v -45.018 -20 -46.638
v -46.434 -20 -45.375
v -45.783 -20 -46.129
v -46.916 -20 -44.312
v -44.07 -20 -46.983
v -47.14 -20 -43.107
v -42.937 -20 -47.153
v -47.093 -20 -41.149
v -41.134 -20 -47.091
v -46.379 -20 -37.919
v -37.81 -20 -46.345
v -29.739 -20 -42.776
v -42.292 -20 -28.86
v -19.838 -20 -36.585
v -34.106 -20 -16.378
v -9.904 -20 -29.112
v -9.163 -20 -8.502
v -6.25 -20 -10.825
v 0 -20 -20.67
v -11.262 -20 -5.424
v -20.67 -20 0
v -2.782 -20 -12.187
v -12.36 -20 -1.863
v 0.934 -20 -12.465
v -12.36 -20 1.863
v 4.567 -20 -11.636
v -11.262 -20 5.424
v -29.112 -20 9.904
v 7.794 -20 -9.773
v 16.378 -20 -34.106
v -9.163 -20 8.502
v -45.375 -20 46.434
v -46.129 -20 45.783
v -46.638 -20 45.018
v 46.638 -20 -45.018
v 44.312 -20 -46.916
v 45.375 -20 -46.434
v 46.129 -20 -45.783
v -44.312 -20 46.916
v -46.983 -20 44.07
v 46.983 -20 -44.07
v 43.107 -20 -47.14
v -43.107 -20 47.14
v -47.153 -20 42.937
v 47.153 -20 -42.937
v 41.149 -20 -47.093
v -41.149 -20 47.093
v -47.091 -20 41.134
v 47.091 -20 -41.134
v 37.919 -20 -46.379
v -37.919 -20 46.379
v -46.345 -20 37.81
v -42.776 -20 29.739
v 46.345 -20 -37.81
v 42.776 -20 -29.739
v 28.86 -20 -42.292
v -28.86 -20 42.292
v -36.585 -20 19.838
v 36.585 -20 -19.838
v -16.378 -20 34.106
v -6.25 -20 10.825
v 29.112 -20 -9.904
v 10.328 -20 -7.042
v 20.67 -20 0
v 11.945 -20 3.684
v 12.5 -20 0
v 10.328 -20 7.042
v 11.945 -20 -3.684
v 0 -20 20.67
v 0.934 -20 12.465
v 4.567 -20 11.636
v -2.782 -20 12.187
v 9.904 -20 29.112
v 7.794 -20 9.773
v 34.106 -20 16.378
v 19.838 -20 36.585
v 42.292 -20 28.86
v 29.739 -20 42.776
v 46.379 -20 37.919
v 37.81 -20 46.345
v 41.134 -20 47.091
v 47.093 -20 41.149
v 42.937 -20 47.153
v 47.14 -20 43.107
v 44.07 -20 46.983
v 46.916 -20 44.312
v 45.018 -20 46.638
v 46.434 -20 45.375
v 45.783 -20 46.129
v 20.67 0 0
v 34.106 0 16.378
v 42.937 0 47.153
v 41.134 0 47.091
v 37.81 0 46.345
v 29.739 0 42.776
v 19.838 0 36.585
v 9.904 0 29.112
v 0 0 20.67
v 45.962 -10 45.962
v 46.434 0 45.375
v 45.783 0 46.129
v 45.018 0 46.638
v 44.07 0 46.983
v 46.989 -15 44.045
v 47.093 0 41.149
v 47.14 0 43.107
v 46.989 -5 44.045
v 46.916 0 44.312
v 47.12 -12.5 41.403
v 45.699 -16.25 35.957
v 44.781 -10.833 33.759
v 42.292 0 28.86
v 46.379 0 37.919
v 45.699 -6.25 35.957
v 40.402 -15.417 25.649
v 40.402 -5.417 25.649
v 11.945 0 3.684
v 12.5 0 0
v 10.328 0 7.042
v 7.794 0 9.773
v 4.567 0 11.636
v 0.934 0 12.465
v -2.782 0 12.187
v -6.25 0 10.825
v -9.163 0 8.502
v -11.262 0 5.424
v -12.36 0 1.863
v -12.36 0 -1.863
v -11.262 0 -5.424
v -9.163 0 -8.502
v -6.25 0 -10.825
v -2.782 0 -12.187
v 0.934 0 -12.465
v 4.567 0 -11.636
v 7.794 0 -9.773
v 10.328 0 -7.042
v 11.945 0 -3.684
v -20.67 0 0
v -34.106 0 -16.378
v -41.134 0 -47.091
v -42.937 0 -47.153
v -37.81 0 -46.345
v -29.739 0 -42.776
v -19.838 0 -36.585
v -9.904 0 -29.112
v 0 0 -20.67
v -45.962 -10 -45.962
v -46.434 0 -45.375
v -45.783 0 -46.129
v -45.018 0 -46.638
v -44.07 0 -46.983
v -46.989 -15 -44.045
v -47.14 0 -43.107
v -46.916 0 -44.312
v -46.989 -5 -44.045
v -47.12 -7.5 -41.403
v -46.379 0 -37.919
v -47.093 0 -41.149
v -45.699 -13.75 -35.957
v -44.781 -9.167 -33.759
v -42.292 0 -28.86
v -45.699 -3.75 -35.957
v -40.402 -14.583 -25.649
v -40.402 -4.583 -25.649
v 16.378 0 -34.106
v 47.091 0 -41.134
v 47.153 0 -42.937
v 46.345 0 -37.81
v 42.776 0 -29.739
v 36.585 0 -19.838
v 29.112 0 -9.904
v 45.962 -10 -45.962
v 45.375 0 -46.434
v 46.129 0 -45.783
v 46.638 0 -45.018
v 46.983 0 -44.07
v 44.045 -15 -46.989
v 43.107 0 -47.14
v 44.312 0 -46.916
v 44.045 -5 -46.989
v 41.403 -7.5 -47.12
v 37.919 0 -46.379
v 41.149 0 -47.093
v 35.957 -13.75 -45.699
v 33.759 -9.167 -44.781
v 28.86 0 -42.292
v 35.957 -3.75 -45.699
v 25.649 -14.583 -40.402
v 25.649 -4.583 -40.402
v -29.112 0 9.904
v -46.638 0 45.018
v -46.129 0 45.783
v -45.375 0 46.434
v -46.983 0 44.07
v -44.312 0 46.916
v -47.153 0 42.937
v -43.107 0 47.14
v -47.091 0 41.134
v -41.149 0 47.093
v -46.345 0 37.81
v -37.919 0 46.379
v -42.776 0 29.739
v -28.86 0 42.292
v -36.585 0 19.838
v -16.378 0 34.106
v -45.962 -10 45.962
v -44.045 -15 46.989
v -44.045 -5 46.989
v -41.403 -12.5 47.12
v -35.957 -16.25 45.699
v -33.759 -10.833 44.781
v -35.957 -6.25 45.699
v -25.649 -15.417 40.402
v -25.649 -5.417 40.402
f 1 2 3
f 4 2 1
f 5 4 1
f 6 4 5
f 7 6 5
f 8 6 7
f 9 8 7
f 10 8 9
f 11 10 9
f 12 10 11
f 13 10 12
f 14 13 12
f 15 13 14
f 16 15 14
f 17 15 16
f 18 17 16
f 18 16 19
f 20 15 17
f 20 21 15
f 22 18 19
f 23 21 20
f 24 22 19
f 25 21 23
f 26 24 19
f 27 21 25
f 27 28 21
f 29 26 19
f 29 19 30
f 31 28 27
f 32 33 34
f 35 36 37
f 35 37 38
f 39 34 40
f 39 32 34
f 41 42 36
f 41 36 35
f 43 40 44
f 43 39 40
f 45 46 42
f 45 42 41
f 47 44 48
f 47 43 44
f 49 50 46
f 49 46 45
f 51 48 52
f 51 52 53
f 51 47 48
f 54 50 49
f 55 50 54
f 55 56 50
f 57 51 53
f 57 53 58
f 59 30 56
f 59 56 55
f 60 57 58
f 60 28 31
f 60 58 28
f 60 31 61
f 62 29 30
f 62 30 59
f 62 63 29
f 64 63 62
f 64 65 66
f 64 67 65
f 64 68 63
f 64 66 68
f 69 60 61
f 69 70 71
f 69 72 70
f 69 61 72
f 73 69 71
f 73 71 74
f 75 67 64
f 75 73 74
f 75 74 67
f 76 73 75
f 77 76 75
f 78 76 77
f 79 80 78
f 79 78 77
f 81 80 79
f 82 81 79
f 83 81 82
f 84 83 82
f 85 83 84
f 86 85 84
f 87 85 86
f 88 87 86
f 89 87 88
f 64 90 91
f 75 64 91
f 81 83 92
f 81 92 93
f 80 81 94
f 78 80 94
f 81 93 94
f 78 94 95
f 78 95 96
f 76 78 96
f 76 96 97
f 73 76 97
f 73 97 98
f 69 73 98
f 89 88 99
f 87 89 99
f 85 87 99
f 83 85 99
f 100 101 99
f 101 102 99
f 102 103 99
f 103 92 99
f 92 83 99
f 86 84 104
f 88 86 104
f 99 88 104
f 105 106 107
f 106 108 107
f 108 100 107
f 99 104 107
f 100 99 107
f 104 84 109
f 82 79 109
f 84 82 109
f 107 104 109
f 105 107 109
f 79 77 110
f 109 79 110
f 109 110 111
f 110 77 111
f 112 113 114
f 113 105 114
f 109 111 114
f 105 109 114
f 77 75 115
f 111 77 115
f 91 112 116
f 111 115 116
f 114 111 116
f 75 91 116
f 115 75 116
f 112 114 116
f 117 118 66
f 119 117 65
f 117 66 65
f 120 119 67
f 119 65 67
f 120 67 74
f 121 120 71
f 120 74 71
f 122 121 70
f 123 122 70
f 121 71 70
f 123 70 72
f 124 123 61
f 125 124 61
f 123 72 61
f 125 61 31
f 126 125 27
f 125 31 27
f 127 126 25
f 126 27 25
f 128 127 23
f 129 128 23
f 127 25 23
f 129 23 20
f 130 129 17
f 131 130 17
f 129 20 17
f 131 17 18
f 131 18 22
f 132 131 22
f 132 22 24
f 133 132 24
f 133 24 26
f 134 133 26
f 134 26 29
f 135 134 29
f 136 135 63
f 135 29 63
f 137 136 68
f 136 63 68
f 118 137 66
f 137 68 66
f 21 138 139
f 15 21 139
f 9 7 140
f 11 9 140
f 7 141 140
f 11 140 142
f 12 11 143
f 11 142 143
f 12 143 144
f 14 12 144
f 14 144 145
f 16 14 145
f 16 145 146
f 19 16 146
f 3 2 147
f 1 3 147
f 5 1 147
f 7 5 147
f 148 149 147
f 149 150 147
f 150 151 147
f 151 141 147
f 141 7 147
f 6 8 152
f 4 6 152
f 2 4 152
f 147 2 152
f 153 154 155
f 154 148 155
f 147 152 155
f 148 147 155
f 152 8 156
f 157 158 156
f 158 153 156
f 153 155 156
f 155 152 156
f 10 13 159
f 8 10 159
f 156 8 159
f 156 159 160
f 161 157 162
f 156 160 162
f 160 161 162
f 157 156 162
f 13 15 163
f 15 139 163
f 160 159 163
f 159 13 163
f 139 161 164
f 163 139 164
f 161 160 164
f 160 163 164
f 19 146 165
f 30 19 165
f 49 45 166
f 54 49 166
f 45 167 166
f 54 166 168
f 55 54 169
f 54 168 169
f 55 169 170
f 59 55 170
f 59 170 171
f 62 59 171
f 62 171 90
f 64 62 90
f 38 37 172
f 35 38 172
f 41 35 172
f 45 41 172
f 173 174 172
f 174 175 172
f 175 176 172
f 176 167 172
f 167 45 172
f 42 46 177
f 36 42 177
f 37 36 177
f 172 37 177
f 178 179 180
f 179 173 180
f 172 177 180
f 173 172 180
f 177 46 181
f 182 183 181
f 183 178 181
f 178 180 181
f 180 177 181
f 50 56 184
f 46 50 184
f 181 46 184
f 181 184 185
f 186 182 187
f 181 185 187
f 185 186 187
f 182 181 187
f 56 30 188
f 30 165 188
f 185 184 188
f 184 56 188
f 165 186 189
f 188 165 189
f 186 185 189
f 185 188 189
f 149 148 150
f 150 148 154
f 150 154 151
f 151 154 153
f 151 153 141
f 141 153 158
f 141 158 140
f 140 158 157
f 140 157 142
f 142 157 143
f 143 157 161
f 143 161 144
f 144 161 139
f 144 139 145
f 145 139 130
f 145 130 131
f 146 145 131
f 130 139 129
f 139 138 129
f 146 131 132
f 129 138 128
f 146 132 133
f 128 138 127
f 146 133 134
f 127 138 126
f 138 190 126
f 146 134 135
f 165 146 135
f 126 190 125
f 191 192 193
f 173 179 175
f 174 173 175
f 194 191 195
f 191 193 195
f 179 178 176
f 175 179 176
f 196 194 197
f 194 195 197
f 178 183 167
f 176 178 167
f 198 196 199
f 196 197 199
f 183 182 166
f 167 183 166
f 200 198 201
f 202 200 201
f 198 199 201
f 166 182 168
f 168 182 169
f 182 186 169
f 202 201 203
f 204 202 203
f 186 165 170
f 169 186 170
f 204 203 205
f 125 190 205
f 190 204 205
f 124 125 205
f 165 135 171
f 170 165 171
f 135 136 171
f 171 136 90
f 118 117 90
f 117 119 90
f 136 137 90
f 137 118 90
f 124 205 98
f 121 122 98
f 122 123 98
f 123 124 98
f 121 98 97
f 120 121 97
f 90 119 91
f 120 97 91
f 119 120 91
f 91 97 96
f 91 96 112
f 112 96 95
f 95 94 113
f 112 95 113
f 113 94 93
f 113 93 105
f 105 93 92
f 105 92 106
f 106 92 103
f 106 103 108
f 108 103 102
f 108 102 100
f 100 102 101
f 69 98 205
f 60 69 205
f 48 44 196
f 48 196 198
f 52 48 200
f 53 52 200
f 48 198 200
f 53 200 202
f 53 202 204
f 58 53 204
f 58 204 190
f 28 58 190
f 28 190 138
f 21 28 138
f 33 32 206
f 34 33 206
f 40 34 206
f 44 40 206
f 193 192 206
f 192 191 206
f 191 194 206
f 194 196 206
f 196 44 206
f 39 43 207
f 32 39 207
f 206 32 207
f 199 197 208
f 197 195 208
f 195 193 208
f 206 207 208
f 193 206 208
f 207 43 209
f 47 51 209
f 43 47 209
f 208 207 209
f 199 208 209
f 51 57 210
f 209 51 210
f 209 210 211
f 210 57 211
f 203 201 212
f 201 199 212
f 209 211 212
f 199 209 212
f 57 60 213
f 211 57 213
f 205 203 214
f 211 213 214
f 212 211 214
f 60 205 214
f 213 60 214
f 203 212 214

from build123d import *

# Parameters (mm, degrees)
F1_DEPTH = 20
F2_R     = 12.5
F3_DEPTH = 20


with BuildPart() as f1:
    # F0 (on Front) → F1 (new body)
    with BuildSketch(Plane.XZ):
        with BuildLine():
            add(Edge.make_bspline(
                [(20.6699586601, 0), (54.3996263023, 37.5242552519), (45.9619407771, 45.9619407771)],
                knots=[4.9391878284, 4.9391878284, 4.9391878284, 6.2831853072, 6.2831853072, 6.2831853072], degree=2, weights=[1, 0.7825789119, 1]))
            add(Edge.make_bspline(
                [(45.9619407771, 45.9619407771), (37.5242552519, 54.3996263023), (0, 20.6699586601)],
                knots=[0, 0, 0, 1.3439974787, 1.3439974787, 1.3439974787], degree=2, weights=[1, 0.7825789119, 1]))
            add(Edge.make_bspline(
                [(20.6699586601, 0), (10.8853628447, 10.8853628447), (0, 20.6699586601)],
                knots=[4.4855901323, 4.4855901323, 4.4855901323, 4.9391878284, 4.9391878284, 4.9391878284], degree=2, weights=[1, 0.9743911957, 1]))
        make_face()
        with BuildLine():
            add(Edge.make_bspline(
                [(20.6699586601, 0), (10.8853628447, 10.8853628447), (0, 20.6699586601)],
                knots=[4.4855901323, 4.4855901323, 4.4855901323, 4.9391878284, 4.9391878284, 4.9391878284], degree=2, weights=[1, 0.9743911957, 1]))
            add(Edge.make_bspline(
                [(0, 20.6699586601), (-10.8853628447, 10.8853628447), (-20.6699586601, 0)],
                knots=[1.3439974787, 1.3439974787, 1.3439974787, 1.7975951748, 1.7975951748, 1.7975951748], degree=2, weights=[1, 0.9743911957, 1]))
            add(Edge.make_bspline(
                [(-20.6699586601, 0), (-10.8853628447, -10.8853628447), (0, -20.6699586601)],
                knots=[1.3439974787, 1.3439974787, 1.3439974787, 1.7975951748, 1.7975951748, 1.7975951748], degree=2, weights=[1, 0.9743911957, 1]))
            add(Edge.make_bspline(
                [(0, -20.6699586601), (10.8853628447, -10.8853628447), (20.6699586601, 0)],
                knots=[4.4855901323, 4.4855901323, 4.4855901323, 4.9391878284, 4.9391878284, 4.9391878284], degree=2, weights=[1, 0.9743911957, 1]))
        make_face()
        with BuildLine():
            add(Edge.make_bspline(
                [(0, 20.6699586601), (-10.8853628447, 10.8853628447), (-20.6699586601, 0)],
                knots=[1.3439974787, 1.3439974787, 1.3439974787, 1.7975951748, 1.7975951748, 1.7975951748], degree=2, weights=[1, 0.9743911957, 1]))
            add(Edge.make_bspline(
                [(0, 20.6699586601), (-37.5242552519, 54.3996263023), (-45.9619407771, 45.9619407771)],
                knots=[4.9391878284, 4.9391878284, 4.9391878284, 6.2831853072, 6.2831853072, 6.2831853072], degree=2, weights=[1, 0.7825789119, 1]))
            add(Edge.make_bspline(
                [(-45.9619407771, 45.9619407771), (-54.3996263023, 37.5242552519), (-20.6699586601, 0)],
                knots=[0, 0, 0, 1.3439974787, 1.3439974787, 1.3439974787], degree=2, weights=[1, 0.7825789119, 1]))
        make_face()
        with BuildLine():
            add(Edge.make_bspline(
                [(0, -20.6699586601), (37.5242552519, -54.3996263023), (45.9619407771, -45.9619407771), (54.3996263023, -37.5242552519), (20.6699586601, 0)],
                knots=[1.7975951748, 1.7975951748, 1.7975951748, 3.1415926536, 3.1415926536, 4.4855901323, 4.4855901323, 4.4855901323], degree=2, weights=[1, 0.7825789119, 1, 0.7825789119, 1]))
            add(Edge.make_bspline(
                [(0, -20.6699586601), (10.8853628447, -10.8853628447), (20.6699586601, 0)],
                knots=[4.4855901323, 4.4855901323, 4.4855901323, 4.9391878284, 4.9391878284, 4.9391878284], degree=2, weights=[1, 0.9743911957, 1]))
        make_face()
        with BuildLine():
            add(Edge.make_bspline(
                [(-20.6699586601, 0), (-10.8853628447, -10.8853628447), (0, -20.6699586601)],
                knots=[1.3439974787, 1.3439974787, 1.3439974787, 1.7975951748, 1.7975951748, 1.7975951748], degree=2, weights=[1, 0.9743911957, 1]))
            add(Edge.make_bspline(
                [(-20.6699586601, 0), (-54.3996263023, -37.5242552519), (-45.9619407771, -45.9619407771), (-37.5242552519, -54.3996263023), (0, -20.6699586601)],
                knots=[1.7975951748, 1.7975951748, 1.7975951748, 3.1415926536, 3.1415926536, 4.4855901323, 4.4855901323, 4.4855901323], degree=2, weights=[1, 0.7825789119, 1, 0.7825789119, 1]))
        make_face()
    extrude(amount=F1_DEPTH)

    # F2 (on face) → F3 (cut)
    with BuildSketch(Plane.XZ.offset(20)):
        Circle(F2_R)
    extrude(amount=-F3_DEPTH, mode=Mode.SUBTRACT)


solid = f1.part
